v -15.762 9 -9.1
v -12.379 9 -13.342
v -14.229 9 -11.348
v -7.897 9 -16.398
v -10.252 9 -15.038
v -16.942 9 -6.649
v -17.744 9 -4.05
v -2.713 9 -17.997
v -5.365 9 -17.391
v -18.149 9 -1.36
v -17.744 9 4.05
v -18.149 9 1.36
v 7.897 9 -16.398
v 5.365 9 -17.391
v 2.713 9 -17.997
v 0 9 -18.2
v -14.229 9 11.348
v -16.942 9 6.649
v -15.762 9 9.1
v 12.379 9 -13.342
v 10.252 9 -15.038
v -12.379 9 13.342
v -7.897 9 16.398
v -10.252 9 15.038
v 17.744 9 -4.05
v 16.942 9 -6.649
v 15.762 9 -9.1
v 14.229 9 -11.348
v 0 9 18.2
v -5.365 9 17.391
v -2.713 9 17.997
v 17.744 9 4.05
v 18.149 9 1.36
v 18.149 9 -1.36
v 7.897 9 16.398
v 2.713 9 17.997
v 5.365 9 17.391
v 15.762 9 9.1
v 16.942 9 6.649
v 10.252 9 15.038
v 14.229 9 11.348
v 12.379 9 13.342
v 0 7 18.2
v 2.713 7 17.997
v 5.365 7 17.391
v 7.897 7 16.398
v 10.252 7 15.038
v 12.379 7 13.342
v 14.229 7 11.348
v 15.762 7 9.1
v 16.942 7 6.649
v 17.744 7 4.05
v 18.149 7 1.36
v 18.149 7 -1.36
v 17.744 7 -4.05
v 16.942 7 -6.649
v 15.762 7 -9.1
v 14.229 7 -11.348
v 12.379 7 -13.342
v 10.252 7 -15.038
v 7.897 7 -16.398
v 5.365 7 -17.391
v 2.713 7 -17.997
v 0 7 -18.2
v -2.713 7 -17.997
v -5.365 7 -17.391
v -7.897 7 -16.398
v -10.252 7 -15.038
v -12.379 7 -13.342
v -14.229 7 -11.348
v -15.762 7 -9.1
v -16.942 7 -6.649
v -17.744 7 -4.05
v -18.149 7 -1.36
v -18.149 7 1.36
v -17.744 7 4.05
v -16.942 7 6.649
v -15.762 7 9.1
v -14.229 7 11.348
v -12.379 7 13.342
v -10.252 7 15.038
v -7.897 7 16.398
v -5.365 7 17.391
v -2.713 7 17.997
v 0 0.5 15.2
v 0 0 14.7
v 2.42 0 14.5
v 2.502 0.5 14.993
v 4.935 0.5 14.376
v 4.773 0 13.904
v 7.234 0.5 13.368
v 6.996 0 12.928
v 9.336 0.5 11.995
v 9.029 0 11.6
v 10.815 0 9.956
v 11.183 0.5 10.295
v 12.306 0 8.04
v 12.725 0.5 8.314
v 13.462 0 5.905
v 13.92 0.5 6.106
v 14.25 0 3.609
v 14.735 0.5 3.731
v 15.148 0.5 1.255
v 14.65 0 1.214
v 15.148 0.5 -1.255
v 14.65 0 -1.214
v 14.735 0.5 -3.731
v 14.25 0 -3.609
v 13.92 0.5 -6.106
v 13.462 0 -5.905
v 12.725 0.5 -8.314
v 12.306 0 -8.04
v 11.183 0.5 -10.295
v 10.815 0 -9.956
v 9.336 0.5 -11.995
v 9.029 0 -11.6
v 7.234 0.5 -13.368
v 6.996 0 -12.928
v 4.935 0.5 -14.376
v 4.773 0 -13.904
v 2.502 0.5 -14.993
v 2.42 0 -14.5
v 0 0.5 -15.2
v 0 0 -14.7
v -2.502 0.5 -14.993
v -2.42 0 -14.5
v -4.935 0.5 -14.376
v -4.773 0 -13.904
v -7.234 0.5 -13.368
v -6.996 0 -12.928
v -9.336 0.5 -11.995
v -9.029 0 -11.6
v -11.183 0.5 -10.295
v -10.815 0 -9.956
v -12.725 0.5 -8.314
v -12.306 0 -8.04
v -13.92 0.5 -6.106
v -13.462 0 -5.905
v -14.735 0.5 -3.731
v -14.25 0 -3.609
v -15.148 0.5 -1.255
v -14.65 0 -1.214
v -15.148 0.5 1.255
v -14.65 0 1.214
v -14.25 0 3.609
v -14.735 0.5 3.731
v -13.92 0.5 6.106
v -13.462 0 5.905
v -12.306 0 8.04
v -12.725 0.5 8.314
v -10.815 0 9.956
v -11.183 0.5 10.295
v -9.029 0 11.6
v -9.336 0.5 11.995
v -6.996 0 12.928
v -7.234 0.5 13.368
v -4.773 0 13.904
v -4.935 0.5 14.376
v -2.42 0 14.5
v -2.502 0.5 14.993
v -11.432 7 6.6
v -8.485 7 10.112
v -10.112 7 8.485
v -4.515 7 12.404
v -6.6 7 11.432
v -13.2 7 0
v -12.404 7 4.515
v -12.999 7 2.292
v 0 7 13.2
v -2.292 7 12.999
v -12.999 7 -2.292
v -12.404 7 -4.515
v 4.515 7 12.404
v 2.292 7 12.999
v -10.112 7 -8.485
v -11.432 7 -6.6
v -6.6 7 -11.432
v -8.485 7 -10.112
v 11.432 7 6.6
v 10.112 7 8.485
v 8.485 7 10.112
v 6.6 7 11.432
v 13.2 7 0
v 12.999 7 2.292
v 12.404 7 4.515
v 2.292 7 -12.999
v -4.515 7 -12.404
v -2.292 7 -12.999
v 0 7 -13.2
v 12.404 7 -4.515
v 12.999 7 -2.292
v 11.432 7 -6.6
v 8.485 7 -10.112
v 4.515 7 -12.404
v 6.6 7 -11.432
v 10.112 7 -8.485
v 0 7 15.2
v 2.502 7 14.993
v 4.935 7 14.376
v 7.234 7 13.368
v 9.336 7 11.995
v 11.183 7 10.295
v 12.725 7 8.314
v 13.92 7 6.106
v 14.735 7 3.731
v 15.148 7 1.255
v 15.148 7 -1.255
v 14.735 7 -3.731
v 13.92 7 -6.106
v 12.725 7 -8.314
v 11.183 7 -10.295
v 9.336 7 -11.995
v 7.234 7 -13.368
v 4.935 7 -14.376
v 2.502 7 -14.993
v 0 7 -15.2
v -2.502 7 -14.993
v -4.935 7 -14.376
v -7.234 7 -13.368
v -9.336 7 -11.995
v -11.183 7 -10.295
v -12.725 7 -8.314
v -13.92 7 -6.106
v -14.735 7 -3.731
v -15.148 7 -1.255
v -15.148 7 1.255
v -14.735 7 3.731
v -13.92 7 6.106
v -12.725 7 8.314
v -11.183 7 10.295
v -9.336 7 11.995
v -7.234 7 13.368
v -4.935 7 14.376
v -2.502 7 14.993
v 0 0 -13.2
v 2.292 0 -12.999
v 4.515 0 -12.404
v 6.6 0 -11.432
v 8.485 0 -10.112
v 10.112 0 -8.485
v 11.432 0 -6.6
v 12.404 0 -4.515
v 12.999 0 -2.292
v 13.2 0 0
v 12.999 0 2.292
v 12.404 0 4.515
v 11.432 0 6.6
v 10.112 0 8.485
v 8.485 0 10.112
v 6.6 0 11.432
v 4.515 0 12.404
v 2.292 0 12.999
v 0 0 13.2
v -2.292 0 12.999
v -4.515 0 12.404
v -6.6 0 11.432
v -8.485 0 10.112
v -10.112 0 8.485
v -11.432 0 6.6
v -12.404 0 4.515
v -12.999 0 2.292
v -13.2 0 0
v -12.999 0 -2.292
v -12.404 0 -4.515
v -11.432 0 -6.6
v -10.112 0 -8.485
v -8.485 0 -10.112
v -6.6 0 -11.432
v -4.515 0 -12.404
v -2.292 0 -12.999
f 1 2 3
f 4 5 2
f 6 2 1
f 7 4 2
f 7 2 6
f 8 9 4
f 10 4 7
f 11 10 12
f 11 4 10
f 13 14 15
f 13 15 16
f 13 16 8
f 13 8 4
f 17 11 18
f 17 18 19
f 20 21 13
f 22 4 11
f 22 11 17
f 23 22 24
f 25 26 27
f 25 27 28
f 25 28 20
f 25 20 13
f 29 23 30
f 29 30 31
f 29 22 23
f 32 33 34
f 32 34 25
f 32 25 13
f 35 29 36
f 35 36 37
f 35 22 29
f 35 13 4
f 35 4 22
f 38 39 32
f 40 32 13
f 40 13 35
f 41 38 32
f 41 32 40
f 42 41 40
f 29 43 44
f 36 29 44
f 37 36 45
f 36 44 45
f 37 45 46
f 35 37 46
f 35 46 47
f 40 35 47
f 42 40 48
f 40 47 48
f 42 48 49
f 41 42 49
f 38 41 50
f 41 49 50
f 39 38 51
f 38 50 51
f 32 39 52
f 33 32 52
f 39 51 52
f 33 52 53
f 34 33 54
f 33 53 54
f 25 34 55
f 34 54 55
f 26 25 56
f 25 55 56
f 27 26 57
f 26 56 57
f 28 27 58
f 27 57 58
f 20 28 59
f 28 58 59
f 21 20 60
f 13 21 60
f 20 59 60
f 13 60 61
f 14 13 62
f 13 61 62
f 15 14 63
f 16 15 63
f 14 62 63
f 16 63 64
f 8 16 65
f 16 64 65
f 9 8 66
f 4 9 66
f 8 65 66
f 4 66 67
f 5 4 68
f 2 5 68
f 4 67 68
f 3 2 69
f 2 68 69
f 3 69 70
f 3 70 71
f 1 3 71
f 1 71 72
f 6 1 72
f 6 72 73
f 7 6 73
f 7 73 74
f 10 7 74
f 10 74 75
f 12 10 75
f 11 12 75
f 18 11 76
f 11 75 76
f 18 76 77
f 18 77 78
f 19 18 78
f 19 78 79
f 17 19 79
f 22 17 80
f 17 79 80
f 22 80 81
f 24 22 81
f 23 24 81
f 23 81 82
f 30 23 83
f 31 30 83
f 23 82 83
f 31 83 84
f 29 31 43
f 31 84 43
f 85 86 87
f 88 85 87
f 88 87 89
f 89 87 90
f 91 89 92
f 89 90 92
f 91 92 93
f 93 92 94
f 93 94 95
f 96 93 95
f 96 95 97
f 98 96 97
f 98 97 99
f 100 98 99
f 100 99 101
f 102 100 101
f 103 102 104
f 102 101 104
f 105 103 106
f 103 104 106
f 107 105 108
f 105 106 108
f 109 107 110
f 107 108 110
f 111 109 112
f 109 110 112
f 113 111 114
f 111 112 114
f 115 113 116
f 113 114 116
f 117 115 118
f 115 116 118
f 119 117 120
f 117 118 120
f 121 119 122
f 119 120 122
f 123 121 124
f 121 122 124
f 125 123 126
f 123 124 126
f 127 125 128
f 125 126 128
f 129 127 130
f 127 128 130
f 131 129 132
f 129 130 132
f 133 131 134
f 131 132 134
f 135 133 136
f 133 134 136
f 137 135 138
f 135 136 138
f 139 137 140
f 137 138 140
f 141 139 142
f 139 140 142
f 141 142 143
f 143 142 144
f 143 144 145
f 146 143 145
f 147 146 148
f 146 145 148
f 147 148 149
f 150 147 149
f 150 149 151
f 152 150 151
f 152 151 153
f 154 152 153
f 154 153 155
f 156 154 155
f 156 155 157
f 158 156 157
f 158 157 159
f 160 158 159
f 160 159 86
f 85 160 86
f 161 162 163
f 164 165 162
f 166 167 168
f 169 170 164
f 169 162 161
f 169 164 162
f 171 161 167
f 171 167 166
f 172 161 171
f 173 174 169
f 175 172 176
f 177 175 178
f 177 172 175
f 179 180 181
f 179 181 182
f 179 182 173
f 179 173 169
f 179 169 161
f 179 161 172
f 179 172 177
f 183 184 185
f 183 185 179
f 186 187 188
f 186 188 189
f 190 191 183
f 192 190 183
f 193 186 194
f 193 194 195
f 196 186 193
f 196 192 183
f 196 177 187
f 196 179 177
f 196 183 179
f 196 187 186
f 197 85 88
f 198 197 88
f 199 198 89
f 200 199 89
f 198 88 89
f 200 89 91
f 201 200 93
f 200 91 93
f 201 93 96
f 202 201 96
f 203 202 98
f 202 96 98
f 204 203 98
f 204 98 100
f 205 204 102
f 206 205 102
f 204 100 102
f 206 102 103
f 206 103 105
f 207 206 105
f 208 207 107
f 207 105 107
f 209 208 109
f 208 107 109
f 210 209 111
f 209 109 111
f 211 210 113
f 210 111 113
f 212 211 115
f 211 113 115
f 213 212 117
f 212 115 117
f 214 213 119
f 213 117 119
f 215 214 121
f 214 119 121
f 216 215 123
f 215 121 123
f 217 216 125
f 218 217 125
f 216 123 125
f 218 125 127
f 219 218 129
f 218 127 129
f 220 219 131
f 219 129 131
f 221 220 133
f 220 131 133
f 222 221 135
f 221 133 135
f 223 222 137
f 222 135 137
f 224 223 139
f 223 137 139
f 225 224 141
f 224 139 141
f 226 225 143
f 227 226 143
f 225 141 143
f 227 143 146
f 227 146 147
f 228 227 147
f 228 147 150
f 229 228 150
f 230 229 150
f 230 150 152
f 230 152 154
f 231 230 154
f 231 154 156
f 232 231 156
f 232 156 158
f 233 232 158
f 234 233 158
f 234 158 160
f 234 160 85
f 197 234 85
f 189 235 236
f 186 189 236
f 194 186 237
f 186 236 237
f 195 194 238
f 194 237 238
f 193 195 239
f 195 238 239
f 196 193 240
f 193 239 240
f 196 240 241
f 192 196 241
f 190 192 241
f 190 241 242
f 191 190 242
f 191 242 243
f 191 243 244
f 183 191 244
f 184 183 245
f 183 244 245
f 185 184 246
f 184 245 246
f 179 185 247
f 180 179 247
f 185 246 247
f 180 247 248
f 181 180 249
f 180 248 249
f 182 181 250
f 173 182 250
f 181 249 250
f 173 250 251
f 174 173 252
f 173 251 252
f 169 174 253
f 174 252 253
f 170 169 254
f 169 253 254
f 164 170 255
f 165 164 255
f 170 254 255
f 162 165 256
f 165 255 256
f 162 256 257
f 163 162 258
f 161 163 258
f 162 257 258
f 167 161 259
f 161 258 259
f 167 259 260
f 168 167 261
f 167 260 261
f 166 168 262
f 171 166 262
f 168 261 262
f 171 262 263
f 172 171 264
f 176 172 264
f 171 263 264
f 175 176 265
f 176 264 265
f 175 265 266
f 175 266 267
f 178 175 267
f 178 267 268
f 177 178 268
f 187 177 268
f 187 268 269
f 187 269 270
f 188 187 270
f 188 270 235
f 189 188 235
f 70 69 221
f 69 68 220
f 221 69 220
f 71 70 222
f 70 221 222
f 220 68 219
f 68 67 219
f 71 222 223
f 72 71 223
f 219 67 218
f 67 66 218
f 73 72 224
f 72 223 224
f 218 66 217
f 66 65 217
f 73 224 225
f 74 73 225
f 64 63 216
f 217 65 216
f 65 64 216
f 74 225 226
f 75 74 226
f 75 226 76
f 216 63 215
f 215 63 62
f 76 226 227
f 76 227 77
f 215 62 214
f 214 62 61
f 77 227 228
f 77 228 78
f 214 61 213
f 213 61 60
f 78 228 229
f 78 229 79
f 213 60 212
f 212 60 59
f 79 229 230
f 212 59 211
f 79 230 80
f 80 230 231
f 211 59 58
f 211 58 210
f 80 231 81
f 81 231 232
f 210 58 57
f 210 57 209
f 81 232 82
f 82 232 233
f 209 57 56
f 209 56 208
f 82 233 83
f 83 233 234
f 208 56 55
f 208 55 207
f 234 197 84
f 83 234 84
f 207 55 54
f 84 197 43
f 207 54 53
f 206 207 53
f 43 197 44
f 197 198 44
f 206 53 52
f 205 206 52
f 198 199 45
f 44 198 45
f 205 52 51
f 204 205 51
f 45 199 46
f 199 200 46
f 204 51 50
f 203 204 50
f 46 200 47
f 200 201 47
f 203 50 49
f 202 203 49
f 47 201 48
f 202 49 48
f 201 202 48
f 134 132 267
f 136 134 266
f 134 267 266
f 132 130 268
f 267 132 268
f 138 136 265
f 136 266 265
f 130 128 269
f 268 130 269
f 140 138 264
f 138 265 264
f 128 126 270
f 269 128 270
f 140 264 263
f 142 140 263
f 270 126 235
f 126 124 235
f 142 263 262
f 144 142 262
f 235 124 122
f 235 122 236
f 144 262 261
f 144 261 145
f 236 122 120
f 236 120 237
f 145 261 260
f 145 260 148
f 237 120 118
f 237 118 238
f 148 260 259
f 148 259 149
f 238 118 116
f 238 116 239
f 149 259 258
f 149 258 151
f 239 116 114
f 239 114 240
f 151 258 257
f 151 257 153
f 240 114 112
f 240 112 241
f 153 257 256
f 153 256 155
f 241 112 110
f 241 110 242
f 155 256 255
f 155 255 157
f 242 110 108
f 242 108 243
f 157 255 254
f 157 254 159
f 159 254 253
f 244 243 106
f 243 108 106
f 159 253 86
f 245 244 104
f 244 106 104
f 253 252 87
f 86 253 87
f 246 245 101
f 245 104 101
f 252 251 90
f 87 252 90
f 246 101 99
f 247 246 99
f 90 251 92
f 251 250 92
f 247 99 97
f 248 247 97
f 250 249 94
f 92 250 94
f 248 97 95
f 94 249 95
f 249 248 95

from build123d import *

# Parameters (mm, degrees)
SKETCH_1_R          = 15.2
D30_4T7_DEPTH       = 7
SKETCH_2_R          = 18.2
SKETCH_2_R_2        = 15.2
EXTRUDE_2_DEPTH     = 2
SKETCH_3_R          = 13.2
CUT_EXTRUDE_1_DEPTH = 7
CHAMFER_1_SIZE      = 0.5


with BuildPart() as part:
    # 스케치1 → D30.4t7 (new body)
    with BuildSketch(Plane(origin=(0, 0, 0), x_dir=(1, 0, 0), z_dir=(0, 1, 0))):
        with Locations(Location((0, 0, 0), (0, 0, 270))):
            Circle(SKETCH_1_R)
    extrude(amount=D30_4T7_DEPTH)

    # 스케치2 → 보스-돌출2 (add)
    # profile 1 of 3: a face of its own
    with BuildSketch(Plane(origin=(0, 7, 0), x_dir=(1, 0, 0), z_dir=(0, 1, 0))):
        with Locations(Location((0, 0, 0), (0, 0, 270))):
            Circle(SKETCH_2_R)
        with Locations(Location((0, 0, 0), (0, 0, 270))):
            Circle(SKETCH_2_R_2, mode=Mode.SUBTRACT)
    # profile 2 of 3: a face of its own
    with BuildSketch(Plane(origin=(0, 7, 0), x_dir=(1, 0, 0), z_dir=(0, 1, 0))):
        with Locations(Location((0, 0, 0), (0, 0, 270))):
            Circle(SKETCH_2_R_2)
    # profile 3 of 3: a face of its own
    with BuildSketch(Plane(origin=(0, 7, 0), x_dir=(1, 0, 0), z_dir=(0, 1, 0))):
        with Locations(Location((0, 0, 0), (0, 0, 270))):
            Circle(SKETCH_2_R_2)
    extrude(amount=EXTRUDE_2_DEPTH)

    # 스케치3 → 컷-돌출1 (cut)
    with BuildSketch(Plane.XZ):
        with Locations(Location((0, 0, 0), (0, 0, 270))):
            Circle(SKETCH_3_R)
    extrude(amount=-CUT_EXTRUDE_1_DEPTH, mode=Mode.SUBTRACT)

    # 모따기1
    chamfer_1_edges = [part.edges().sort_by_distance(p)[0] for p in [
        (0, 0, -15.2),
    ]]
    chamfer(chamfer_1_edges, length=CHAMFER_1_SIZE)


solid = part.part
